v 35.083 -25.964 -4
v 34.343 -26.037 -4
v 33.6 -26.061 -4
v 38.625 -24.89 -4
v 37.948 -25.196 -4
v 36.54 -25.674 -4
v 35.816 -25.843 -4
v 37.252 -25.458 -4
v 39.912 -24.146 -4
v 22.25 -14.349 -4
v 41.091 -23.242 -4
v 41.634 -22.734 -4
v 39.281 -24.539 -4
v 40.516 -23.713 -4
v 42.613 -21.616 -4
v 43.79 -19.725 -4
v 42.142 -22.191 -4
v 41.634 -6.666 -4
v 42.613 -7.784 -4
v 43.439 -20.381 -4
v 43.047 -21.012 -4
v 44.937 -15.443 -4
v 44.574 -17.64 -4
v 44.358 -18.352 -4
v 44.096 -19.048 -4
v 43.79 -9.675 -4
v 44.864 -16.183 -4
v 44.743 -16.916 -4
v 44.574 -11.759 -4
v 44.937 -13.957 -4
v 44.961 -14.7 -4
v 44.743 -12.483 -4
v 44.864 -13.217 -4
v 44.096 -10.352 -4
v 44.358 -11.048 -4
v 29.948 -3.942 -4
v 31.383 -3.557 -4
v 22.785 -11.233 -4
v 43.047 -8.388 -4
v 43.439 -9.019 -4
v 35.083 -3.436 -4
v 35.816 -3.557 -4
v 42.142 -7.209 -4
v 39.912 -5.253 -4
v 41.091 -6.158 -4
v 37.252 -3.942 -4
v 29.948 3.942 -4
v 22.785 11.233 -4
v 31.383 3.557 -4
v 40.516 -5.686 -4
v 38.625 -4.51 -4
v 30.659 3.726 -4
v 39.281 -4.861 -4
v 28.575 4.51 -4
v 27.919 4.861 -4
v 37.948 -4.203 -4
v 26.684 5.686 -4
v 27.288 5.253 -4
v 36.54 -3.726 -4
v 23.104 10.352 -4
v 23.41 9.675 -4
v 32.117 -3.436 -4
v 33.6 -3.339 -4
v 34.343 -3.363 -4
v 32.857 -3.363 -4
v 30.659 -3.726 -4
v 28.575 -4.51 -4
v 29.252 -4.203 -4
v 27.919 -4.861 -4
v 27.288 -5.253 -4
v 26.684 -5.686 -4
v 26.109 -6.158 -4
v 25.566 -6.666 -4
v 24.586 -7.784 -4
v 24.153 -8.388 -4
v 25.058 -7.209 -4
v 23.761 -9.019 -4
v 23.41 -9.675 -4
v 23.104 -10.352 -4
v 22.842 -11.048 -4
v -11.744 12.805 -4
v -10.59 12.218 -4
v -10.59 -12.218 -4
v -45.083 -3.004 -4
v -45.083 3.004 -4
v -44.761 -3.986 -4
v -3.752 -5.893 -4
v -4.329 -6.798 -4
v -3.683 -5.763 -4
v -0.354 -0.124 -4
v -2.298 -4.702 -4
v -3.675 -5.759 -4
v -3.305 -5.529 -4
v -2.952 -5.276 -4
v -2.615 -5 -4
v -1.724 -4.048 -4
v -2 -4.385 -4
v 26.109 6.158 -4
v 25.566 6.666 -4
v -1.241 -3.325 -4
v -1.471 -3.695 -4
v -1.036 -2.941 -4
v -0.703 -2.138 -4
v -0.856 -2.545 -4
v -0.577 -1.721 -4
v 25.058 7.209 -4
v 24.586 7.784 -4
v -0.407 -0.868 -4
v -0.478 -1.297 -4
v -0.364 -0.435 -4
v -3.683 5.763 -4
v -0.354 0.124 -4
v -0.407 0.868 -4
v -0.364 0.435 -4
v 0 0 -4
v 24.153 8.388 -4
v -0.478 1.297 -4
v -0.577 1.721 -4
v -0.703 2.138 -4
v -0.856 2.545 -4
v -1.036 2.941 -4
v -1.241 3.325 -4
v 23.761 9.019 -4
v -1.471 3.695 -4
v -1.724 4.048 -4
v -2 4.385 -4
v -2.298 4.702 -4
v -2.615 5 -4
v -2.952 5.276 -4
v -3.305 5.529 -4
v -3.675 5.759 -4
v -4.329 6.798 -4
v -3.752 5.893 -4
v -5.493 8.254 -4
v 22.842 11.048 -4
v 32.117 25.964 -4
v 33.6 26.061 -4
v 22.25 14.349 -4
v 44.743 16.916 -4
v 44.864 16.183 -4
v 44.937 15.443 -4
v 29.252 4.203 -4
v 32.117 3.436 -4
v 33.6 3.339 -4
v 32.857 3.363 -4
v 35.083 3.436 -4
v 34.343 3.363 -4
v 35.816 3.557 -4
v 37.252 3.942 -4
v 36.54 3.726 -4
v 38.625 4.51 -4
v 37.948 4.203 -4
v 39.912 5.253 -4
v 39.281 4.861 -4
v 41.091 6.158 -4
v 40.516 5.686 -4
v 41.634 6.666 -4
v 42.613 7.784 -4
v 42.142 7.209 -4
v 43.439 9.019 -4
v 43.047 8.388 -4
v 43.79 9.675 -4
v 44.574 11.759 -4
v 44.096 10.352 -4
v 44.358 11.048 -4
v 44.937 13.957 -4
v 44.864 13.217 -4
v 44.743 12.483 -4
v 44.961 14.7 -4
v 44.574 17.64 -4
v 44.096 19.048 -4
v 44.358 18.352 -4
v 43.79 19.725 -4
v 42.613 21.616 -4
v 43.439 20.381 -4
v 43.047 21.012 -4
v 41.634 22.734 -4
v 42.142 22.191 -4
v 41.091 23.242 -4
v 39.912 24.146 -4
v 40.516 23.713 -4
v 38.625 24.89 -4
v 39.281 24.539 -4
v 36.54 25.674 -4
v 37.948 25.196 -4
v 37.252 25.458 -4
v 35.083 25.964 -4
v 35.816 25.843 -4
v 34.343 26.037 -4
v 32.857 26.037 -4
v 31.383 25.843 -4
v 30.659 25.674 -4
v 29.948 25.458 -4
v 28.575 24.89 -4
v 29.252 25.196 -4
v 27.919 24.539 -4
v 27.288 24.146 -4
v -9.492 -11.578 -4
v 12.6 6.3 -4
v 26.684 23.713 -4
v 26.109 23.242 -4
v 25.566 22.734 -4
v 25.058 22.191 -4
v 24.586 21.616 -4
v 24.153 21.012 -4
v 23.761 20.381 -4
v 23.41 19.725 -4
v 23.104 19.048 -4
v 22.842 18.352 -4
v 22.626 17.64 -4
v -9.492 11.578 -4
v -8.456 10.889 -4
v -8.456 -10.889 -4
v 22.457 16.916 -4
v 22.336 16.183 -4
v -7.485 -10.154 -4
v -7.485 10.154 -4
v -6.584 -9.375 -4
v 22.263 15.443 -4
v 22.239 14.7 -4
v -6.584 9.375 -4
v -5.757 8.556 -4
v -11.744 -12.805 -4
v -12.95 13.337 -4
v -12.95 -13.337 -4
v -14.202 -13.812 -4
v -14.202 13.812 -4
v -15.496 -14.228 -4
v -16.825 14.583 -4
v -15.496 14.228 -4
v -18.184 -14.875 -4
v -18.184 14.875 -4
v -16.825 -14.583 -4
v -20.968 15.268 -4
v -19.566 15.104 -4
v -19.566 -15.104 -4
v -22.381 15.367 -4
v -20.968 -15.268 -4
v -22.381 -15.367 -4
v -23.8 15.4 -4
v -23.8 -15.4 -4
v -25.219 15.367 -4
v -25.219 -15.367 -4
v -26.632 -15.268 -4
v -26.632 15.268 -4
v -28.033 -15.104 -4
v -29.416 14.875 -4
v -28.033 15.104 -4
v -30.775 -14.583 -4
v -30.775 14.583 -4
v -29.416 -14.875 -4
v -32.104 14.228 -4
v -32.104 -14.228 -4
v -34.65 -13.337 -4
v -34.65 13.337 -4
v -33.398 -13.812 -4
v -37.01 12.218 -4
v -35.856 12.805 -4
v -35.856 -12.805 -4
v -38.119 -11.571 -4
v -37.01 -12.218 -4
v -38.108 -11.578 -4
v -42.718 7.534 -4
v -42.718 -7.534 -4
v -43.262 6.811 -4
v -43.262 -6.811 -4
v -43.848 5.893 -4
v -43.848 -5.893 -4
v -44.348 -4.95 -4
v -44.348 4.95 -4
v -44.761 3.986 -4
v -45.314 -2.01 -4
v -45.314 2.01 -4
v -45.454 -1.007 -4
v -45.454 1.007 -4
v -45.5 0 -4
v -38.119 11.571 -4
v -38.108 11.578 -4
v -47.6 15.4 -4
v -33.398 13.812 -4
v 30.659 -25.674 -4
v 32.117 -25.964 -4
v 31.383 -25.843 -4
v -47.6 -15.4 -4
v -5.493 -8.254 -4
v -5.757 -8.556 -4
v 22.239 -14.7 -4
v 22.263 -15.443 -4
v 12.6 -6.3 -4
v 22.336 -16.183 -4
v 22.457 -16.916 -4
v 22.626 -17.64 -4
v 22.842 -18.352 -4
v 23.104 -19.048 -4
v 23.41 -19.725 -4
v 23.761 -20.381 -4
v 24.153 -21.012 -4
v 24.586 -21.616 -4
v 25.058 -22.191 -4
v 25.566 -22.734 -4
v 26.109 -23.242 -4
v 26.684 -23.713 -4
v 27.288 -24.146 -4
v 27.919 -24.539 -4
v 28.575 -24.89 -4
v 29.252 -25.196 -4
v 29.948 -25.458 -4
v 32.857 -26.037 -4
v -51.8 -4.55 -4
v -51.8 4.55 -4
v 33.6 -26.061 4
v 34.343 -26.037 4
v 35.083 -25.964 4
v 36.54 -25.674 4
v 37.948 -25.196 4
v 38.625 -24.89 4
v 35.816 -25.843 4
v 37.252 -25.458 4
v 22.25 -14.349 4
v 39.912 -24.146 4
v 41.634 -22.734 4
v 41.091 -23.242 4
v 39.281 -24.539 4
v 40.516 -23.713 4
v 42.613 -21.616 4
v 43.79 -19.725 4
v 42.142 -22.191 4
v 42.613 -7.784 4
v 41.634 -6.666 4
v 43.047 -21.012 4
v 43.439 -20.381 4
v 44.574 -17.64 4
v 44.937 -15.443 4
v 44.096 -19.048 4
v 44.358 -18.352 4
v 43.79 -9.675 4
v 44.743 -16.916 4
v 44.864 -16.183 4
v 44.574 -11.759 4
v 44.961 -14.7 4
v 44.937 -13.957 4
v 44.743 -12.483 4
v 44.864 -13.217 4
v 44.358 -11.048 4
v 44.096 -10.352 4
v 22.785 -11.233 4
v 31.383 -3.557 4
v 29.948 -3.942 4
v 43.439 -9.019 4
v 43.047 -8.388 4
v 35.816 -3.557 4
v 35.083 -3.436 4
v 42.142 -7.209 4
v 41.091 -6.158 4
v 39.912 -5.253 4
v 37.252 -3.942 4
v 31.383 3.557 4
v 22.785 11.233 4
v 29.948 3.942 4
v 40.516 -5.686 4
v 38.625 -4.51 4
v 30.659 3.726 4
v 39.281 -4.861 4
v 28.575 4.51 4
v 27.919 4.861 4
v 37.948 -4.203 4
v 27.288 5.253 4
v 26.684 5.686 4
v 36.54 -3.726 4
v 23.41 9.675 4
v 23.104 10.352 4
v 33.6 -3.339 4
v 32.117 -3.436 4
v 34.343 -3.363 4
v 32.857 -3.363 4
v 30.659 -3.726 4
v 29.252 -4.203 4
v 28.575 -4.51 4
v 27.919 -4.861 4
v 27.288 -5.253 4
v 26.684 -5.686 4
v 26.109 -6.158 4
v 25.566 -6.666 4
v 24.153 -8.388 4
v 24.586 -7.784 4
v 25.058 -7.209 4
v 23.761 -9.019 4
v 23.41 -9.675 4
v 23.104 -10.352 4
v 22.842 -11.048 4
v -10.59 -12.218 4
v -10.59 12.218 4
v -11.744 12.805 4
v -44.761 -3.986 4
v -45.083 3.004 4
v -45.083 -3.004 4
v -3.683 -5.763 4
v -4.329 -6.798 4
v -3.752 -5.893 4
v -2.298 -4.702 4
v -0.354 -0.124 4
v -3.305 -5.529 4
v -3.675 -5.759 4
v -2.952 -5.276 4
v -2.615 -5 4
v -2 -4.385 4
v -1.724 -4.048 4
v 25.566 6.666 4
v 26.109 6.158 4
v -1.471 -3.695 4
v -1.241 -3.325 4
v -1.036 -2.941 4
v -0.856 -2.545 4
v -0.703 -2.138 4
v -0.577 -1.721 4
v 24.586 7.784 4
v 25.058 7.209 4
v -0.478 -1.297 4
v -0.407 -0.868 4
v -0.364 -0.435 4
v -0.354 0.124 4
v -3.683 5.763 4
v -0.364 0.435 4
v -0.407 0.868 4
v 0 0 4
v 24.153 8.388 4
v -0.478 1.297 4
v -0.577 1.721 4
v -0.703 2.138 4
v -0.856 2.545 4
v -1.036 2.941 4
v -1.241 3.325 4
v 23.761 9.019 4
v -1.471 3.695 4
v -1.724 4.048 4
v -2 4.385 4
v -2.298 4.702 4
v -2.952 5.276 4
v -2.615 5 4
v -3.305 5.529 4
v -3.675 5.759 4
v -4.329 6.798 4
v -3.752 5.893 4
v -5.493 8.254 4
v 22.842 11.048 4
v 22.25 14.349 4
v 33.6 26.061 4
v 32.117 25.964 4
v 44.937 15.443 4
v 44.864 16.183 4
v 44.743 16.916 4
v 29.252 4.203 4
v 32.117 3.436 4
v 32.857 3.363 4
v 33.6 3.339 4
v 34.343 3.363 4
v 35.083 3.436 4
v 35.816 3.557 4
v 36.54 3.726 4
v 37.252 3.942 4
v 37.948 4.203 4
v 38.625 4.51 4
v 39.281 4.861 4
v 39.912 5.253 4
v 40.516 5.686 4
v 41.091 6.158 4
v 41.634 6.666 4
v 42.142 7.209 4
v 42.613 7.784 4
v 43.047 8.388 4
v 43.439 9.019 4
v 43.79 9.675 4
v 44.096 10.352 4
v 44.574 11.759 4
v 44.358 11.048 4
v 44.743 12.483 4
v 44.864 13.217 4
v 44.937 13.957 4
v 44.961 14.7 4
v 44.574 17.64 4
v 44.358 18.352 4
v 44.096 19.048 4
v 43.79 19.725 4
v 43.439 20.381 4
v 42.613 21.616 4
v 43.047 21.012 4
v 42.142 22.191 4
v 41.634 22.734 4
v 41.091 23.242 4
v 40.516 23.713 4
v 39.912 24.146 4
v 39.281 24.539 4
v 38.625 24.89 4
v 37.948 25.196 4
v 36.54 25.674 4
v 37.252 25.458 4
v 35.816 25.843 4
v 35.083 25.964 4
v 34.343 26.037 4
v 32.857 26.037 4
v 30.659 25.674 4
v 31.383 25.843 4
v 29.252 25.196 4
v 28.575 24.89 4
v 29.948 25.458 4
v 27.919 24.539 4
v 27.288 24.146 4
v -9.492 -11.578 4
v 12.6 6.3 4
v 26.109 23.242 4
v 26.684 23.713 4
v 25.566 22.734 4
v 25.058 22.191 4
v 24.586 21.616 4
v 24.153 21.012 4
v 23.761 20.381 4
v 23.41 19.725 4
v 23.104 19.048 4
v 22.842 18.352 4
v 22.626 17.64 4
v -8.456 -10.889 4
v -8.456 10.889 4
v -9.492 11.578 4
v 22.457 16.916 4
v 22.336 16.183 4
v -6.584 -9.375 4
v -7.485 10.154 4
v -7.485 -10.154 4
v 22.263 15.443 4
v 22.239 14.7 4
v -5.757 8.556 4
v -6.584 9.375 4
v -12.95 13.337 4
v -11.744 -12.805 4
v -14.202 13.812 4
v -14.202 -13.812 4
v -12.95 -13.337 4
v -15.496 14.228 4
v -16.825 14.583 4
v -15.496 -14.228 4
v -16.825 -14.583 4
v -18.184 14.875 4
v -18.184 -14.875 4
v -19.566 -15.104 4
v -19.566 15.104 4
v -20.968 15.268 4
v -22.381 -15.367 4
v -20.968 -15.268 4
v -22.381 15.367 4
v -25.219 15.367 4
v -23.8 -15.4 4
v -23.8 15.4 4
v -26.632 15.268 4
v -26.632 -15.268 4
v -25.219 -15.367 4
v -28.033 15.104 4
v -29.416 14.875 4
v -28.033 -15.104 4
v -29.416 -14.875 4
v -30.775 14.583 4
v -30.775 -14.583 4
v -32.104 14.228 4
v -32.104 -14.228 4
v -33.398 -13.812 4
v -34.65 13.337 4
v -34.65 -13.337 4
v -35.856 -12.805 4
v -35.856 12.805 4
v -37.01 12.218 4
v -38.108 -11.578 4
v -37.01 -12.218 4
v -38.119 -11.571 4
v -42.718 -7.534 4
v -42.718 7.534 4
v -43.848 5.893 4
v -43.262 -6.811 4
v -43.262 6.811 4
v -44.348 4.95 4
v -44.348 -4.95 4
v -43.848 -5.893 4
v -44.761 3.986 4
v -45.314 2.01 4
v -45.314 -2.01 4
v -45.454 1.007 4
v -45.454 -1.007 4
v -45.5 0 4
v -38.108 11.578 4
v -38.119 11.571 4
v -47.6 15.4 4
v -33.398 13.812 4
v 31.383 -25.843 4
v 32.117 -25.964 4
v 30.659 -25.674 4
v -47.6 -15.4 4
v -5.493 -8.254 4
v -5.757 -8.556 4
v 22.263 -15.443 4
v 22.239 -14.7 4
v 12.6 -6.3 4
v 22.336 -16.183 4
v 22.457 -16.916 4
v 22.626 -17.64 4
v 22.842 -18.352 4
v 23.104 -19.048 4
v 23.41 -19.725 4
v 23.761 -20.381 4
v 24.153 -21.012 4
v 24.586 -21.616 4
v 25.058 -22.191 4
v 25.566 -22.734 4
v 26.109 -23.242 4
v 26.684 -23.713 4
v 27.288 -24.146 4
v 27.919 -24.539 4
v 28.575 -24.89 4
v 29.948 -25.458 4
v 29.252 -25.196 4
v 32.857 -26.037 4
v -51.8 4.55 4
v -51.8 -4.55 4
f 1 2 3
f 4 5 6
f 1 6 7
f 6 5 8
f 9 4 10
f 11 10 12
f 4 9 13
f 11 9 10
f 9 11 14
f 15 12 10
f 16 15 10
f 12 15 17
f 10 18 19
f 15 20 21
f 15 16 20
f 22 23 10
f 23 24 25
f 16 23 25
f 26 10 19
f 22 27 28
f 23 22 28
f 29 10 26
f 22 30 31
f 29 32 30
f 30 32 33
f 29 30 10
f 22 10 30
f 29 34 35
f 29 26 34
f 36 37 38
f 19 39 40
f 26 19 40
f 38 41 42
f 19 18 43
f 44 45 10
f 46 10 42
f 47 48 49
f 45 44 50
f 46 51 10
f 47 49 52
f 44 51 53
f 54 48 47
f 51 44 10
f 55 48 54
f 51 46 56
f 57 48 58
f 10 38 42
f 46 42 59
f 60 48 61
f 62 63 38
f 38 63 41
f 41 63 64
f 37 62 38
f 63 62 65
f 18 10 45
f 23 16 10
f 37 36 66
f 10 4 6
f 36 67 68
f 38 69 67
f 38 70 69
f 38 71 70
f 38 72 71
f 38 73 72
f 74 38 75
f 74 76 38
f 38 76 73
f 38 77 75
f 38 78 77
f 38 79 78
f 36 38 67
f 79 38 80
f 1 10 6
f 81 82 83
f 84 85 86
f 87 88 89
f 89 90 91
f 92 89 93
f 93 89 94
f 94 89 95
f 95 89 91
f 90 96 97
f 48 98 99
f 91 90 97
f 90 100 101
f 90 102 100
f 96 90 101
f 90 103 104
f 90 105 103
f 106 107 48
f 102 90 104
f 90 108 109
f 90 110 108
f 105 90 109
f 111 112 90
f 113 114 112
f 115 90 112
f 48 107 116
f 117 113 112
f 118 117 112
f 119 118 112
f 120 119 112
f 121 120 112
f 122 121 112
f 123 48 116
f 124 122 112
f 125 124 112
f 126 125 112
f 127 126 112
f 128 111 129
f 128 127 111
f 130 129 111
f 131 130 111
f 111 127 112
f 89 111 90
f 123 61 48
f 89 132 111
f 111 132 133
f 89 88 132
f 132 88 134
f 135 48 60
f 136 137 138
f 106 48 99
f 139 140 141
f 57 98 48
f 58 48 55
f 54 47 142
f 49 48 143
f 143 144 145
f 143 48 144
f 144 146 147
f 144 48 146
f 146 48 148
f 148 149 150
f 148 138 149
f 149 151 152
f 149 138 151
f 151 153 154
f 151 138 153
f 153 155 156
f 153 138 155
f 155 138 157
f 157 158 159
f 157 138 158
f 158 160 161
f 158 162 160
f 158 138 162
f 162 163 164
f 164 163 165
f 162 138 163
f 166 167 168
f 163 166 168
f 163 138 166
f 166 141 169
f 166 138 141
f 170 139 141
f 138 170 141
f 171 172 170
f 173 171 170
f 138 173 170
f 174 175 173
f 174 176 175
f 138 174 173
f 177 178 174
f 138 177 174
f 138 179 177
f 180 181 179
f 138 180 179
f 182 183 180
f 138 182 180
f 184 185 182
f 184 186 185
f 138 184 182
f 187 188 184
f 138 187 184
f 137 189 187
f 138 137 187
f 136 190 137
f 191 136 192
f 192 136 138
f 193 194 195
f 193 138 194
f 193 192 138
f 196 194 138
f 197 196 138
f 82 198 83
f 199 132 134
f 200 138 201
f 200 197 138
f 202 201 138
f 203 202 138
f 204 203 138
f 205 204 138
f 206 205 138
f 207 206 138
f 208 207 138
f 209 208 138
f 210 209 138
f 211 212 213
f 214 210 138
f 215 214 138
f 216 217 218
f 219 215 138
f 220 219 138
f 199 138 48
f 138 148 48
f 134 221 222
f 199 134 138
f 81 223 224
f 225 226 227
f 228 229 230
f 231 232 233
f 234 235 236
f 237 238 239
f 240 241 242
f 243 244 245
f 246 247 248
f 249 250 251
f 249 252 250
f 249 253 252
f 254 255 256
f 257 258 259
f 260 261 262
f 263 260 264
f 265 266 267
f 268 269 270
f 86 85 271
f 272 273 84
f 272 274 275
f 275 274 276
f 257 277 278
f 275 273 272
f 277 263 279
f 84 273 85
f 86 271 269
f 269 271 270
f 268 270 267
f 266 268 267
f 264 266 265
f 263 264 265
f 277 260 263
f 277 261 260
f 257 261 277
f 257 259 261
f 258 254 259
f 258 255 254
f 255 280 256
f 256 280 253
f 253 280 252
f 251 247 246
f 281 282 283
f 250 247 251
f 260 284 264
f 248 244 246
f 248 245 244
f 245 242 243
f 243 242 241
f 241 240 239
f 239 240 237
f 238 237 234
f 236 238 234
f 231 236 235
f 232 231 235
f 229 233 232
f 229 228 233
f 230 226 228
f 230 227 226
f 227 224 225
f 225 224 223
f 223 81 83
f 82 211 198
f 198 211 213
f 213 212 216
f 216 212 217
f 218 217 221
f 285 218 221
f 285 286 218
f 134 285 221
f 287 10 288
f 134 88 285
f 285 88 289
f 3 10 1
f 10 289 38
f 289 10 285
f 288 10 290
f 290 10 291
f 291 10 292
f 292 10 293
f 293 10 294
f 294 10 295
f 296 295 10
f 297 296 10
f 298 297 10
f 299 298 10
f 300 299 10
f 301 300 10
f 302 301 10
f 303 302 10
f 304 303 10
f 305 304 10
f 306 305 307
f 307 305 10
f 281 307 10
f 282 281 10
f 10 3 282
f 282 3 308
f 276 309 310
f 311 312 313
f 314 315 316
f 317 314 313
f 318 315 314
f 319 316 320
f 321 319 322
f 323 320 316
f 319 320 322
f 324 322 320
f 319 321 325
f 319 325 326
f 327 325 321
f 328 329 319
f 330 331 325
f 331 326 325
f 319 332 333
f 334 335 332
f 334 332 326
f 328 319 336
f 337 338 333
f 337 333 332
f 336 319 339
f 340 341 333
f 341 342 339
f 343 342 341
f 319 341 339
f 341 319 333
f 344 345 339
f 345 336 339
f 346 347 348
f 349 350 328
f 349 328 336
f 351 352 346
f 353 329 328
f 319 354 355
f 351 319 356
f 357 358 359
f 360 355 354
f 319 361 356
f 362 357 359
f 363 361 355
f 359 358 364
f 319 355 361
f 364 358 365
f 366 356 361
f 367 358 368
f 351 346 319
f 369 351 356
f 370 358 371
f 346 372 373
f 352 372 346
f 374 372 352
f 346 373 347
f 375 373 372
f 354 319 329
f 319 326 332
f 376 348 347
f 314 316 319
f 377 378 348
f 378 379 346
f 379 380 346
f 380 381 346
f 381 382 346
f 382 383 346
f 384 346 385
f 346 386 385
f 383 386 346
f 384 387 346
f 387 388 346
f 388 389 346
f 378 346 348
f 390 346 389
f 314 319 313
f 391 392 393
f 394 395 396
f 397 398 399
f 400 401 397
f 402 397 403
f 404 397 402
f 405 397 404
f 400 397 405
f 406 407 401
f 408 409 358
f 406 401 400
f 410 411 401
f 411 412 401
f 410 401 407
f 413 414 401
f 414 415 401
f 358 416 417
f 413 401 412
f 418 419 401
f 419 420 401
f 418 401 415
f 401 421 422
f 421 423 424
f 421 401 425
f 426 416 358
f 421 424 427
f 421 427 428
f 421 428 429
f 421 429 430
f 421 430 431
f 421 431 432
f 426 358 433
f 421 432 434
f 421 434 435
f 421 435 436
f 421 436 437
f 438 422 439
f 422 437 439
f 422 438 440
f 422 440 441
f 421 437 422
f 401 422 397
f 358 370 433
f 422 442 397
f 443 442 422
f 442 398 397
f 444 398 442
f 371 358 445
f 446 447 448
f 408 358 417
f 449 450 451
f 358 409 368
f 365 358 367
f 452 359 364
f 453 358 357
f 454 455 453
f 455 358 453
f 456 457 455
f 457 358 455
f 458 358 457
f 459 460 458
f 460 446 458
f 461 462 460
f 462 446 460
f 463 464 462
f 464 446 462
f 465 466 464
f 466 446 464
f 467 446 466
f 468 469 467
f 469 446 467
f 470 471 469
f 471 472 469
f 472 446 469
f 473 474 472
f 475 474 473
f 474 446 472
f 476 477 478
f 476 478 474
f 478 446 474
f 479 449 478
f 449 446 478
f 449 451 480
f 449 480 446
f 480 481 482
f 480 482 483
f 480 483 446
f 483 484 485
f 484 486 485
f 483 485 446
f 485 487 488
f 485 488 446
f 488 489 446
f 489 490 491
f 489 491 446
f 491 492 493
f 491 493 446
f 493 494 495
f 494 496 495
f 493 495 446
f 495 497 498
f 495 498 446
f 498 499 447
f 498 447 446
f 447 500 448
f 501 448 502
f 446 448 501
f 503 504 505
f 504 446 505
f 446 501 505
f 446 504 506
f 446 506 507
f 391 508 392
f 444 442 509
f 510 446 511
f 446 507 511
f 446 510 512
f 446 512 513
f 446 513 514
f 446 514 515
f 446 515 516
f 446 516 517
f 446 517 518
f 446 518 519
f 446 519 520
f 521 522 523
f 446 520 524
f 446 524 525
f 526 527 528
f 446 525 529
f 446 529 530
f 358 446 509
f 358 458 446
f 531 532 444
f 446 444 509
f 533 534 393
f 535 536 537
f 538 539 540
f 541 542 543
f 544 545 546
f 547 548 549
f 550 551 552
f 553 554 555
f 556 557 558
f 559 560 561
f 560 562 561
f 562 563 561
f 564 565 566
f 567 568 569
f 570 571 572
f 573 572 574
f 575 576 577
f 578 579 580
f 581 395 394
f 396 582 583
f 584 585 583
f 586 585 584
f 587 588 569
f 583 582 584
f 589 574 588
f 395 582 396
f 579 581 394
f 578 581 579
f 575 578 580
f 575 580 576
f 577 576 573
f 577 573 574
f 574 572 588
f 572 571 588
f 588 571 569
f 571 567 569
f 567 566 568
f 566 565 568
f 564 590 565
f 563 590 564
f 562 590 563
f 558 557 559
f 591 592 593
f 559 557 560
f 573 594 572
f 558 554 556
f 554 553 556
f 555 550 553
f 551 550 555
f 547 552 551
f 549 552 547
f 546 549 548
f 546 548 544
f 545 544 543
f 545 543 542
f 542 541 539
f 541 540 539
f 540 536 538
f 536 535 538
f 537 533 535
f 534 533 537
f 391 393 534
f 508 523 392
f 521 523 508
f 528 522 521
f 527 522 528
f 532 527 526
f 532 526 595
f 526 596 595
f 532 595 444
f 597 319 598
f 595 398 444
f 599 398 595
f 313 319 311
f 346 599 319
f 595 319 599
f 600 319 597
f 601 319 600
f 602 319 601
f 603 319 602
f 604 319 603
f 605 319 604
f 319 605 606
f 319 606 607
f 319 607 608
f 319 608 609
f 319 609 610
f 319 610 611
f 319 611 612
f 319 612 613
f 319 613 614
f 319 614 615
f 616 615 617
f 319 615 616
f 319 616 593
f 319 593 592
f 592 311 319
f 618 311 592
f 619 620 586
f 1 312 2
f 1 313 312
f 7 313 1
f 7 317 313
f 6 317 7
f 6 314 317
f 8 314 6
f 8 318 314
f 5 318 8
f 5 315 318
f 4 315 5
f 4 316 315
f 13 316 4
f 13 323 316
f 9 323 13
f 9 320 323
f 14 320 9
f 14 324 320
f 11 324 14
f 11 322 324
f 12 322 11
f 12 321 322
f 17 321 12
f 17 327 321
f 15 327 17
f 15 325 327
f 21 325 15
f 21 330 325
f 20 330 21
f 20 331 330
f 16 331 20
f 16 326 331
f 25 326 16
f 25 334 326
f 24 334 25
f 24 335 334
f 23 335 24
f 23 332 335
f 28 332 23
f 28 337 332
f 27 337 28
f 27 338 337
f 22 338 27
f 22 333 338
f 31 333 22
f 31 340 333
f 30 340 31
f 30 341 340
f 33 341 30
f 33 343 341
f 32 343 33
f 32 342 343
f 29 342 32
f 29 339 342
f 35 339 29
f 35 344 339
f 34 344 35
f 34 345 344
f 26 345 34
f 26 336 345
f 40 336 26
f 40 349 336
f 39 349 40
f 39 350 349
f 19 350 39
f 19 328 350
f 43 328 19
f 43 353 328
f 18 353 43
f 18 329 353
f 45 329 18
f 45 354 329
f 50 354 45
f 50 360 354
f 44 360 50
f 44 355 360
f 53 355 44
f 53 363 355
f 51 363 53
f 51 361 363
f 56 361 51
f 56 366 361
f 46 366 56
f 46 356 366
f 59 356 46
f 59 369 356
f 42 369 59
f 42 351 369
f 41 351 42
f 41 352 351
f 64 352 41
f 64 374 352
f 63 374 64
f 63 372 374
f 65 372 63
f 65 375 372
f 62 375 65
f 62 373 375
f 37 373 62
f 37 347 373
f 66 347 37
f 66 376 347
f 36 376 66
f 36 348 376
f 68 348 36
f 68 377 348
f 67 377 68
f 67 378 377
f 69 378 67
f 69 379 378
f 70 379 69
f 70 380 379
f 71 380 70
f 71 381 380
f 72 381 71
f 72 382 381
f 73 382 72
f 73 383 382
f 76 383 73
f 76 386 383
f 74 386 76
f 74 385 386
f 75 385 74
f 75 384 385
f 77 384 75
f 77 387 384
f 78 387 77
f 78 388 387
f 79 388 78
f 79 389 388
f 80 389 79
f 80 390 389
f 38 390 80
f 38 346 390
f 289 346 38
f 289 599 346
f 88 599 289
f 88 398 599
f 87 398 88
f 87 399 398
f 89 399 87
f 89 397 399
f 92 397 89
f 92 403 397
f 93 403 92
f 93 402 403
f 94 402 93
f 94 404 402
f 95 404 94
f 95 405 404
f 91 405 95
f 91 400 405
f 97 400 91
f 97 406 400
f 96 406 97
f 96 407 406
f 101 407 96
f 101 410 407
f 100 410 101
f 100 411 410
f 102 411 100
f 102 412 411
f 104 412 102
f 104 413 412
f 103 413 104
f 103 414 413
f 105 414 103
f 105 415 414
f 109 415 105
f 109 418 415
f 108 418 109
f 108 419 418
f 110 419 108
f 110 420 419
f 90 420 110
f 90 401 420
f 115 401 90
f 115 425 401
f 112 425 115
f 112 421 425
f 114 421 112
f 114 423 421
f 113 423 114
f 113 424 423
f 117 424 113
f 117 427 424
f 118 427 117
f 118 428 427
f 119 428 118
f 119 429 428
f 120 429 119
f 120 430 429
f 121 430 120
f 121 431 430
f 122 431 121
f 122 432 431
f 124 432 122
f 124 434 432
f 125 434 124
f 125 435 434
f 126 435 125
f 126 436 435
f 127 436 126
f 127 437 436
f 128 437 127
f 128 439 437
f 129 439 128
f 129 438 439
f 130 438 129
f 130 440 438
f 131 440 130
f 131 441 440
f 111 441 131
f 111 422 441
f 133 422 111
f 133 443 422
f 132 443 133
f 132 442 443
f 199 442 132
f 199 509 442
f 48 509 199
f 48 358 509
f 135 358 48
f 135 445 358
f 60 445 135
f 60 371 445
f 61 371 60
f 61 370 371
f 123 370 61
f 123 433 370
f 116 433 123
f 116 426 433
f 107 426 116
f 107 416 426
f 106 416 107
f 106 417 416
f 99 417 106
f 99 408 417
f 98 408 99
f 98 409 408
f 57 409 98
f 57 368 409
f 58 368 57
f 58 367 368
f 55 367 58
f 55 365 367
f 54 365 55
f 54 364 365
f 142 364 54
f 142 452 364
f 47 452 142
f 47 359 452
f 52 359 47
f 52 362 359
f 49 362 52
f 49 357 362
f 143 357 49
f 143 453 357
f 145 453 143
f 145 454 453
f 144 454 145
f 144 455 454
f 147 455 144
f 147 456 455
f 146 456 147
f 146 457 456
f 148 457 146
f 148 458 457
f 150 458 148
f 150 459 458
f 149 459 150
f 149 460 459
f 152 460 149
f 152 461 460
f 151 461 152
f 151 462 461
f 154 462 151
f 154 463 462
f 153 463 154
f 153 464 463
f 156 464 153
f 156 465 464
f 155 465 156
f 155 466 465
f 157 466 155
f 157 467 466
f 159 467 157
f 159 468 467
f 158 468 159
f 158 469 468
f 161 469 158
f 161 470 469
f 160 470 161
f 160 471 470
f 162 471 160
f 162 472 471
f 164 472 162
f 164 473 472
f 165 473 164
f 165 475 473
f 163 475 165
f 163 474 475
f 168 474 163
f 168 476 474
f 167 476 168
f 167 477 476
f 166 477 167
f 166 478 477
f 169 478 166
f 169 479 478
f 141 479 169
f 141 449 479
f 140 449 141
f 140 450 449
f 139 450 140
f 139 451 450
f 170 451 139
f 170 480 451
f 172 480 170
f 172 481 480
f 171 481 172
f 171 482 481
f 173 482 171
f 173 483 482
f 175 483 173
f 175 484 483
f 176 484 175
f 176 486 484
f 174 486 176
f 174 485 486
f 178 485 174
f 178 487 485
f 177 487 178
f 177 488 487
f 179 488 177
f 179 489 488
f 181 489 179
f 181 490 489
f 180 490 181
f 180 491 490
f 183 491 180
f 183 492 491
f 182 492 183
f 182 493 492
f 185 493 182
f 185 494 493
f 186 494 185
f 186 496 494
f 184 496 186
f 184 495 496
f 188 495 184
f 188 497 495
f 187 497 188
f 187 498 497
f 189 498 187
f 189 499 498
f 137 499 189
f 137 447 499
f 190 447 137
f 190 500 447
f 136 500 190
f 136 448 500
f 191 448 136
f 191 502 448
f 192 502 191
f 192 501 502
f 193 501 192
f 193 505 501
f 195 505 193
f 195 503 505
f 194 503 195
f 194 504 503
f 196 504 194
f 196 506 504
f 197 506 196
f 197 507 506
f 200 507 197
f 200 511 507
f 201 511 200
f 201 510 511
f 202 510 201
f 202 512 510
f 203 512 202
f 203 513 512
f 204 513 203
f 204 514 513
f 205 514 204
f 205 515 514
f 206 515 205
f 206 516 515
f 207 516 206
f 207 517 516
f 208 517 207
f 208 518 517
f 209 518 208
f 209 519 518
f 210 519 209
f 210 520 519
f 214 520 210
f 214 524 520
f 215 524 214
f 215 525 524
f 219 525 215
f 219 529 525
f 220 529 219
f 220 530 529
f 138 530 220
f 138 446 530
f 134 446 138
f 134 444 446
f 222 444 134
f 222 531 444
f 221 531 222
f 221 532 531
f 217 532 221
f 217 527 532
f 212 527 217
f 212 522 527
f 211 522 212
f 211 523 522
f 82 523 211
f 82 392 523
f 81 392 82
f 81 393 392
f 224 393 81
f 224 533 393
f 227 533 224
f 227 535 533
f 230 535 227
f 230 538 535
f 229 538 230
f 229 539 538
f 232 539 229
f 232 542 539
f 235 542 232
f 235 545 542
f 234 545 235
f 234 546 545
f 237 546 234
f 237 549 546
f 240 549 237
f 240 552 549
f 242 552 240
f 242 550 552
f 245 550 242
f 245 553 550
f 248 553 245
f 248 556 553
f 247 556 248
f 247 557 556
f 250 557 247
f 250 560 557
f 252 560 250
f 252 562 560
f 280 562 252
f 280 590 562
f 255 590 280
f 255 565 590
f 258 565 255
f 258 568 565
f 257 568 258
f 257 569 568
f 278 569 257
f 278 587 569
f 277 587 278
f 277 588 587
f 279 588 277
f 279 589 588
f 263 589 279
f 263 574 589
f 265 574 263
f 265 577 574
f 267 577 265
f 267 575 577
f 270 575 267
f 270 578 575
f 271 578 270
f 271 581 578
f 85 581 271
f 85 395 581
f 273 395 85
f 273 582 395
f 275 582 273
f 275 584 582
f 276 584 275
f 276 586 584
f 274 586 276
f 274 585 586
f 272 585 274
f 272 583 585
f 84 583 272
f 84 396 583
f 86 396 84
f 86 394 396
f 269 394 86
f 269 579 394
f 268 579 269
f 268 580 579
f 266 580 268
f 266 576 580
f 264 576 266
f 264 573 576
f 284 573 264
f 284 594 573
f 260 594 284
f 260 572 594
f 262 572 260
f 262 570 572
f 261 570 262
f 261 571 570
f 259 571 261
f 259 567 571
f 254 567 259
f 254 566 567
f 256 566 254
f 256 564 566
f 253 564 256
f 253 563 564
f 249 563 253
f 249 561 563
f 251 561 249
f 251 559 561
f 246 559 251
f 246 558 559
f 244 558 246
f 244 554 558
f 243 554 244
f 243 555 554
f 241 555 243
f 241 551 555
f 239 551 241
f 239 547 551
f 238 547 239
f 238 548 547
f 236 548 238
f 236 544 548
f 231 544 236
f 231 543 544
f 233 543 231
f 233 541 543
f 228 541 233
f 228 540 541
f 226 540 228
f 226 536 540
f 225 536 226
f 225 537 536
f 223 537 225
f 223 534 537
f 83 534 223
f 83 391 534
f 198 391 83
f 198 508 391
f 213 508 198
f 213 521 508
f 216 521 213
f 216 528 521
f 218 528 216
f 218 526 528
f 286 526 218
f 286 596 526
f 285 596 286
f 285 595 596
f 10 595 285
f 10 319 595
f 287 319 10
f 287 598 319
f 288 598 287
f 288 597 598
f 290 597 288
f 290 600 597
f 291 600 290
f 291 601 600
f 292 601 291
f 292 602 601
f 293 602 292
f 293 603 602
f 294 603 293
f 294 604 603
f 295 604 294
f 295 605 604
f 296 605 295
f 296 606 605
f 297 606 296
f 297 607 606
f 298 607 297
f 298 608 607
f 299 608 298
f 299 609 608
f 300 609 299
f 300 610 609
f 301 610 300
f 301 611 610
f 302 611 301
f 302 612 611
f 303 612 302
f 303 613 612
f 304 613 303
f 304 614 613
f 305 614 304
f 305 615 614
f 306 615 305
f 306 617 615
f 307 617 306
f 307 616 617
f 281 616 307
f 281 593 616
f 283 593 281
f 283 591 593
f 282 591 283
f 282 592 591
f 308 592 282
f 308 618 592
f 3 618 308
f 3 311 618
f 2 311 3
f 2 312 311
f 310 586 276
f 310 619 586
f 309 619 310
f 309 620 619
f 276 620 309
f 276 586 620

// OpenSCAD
/*
  Modelo 3D de tortuga equilibrada en el hocico.
  - El punto (0, 0) es el punto de apoyo en el hocico.
  - El espesor frontal de las aletas delanteras (circulos) se calibra
    para ubicar el centro de masa cerca de (0, 0).
*/

$fn = 96;

front_flipper_radius = 1.623037; // calibrado con calculo_centro_masa.py
scale_mm = 7;                    // 1 unidad CAD = 7 mm
thickness_mm = 8;                // espesor de extrusion

module turtle_2d(r = front_flipper_radius) {
    union() {
        // Caparazon (elipse)
        translate([-3.4, 0]) scale([3.1, 2.2]) circle(r = 1);

        // Cabeza
        translate([-1.0, 0]) circle(r = 0.95);

        // Hocico (punto de apoyo en (0,0))
        polygon(points = [
            [0.0, 0.0],
            [-0.8, 0.28],
            [-0.8, -0.28]
        ]);

        // Cola
        polygon(points = [
            [-6.5, 0.0],
            [-7.4, 0.65],
            [-7.4, -0.65]
        ]);

        // Aleta delantera superior
        polygon(points = [
            [-1.6, 1.0],
            [5.0, 2.45],
            [1.8, 0.9]
        ]);

        // Aleta delantera inferior
        polygon(points = [
            [-1.6, -1.0],
            [5.0, -2.45],
            [1.8, -0.9]
        ]);

        // Aleta trasera superior
        polygon(points = [
            [-4.2, 1.15],
            [-6.8, 2.2],
            [-5.9, 0.75]
        ]);

        // Aleta trasera inferior
        polygon(points = [
            [-4.2, -1.15],
            [-6.8, -2.2],
            [-5.9, -0.75]
        ]);

        // Engrosamiento frontal de aletas (ajuste de masa)
        translate([4.8, 2.1]) circle(r = r);
        translate([4.8, -2.1]) circle(r = r);
    }
}

linear_extrude(height = thickness_mm, center = true, convexity = 10)
    scale([scale_mm, scale_mm]) turtle_2d(front_flipper_radius);

// Marcador visual del apoyo
%translate([0, 0, thickness_mm / 2 + 0.5]) cylinder(h = 1, r = 0.35, center = true);
